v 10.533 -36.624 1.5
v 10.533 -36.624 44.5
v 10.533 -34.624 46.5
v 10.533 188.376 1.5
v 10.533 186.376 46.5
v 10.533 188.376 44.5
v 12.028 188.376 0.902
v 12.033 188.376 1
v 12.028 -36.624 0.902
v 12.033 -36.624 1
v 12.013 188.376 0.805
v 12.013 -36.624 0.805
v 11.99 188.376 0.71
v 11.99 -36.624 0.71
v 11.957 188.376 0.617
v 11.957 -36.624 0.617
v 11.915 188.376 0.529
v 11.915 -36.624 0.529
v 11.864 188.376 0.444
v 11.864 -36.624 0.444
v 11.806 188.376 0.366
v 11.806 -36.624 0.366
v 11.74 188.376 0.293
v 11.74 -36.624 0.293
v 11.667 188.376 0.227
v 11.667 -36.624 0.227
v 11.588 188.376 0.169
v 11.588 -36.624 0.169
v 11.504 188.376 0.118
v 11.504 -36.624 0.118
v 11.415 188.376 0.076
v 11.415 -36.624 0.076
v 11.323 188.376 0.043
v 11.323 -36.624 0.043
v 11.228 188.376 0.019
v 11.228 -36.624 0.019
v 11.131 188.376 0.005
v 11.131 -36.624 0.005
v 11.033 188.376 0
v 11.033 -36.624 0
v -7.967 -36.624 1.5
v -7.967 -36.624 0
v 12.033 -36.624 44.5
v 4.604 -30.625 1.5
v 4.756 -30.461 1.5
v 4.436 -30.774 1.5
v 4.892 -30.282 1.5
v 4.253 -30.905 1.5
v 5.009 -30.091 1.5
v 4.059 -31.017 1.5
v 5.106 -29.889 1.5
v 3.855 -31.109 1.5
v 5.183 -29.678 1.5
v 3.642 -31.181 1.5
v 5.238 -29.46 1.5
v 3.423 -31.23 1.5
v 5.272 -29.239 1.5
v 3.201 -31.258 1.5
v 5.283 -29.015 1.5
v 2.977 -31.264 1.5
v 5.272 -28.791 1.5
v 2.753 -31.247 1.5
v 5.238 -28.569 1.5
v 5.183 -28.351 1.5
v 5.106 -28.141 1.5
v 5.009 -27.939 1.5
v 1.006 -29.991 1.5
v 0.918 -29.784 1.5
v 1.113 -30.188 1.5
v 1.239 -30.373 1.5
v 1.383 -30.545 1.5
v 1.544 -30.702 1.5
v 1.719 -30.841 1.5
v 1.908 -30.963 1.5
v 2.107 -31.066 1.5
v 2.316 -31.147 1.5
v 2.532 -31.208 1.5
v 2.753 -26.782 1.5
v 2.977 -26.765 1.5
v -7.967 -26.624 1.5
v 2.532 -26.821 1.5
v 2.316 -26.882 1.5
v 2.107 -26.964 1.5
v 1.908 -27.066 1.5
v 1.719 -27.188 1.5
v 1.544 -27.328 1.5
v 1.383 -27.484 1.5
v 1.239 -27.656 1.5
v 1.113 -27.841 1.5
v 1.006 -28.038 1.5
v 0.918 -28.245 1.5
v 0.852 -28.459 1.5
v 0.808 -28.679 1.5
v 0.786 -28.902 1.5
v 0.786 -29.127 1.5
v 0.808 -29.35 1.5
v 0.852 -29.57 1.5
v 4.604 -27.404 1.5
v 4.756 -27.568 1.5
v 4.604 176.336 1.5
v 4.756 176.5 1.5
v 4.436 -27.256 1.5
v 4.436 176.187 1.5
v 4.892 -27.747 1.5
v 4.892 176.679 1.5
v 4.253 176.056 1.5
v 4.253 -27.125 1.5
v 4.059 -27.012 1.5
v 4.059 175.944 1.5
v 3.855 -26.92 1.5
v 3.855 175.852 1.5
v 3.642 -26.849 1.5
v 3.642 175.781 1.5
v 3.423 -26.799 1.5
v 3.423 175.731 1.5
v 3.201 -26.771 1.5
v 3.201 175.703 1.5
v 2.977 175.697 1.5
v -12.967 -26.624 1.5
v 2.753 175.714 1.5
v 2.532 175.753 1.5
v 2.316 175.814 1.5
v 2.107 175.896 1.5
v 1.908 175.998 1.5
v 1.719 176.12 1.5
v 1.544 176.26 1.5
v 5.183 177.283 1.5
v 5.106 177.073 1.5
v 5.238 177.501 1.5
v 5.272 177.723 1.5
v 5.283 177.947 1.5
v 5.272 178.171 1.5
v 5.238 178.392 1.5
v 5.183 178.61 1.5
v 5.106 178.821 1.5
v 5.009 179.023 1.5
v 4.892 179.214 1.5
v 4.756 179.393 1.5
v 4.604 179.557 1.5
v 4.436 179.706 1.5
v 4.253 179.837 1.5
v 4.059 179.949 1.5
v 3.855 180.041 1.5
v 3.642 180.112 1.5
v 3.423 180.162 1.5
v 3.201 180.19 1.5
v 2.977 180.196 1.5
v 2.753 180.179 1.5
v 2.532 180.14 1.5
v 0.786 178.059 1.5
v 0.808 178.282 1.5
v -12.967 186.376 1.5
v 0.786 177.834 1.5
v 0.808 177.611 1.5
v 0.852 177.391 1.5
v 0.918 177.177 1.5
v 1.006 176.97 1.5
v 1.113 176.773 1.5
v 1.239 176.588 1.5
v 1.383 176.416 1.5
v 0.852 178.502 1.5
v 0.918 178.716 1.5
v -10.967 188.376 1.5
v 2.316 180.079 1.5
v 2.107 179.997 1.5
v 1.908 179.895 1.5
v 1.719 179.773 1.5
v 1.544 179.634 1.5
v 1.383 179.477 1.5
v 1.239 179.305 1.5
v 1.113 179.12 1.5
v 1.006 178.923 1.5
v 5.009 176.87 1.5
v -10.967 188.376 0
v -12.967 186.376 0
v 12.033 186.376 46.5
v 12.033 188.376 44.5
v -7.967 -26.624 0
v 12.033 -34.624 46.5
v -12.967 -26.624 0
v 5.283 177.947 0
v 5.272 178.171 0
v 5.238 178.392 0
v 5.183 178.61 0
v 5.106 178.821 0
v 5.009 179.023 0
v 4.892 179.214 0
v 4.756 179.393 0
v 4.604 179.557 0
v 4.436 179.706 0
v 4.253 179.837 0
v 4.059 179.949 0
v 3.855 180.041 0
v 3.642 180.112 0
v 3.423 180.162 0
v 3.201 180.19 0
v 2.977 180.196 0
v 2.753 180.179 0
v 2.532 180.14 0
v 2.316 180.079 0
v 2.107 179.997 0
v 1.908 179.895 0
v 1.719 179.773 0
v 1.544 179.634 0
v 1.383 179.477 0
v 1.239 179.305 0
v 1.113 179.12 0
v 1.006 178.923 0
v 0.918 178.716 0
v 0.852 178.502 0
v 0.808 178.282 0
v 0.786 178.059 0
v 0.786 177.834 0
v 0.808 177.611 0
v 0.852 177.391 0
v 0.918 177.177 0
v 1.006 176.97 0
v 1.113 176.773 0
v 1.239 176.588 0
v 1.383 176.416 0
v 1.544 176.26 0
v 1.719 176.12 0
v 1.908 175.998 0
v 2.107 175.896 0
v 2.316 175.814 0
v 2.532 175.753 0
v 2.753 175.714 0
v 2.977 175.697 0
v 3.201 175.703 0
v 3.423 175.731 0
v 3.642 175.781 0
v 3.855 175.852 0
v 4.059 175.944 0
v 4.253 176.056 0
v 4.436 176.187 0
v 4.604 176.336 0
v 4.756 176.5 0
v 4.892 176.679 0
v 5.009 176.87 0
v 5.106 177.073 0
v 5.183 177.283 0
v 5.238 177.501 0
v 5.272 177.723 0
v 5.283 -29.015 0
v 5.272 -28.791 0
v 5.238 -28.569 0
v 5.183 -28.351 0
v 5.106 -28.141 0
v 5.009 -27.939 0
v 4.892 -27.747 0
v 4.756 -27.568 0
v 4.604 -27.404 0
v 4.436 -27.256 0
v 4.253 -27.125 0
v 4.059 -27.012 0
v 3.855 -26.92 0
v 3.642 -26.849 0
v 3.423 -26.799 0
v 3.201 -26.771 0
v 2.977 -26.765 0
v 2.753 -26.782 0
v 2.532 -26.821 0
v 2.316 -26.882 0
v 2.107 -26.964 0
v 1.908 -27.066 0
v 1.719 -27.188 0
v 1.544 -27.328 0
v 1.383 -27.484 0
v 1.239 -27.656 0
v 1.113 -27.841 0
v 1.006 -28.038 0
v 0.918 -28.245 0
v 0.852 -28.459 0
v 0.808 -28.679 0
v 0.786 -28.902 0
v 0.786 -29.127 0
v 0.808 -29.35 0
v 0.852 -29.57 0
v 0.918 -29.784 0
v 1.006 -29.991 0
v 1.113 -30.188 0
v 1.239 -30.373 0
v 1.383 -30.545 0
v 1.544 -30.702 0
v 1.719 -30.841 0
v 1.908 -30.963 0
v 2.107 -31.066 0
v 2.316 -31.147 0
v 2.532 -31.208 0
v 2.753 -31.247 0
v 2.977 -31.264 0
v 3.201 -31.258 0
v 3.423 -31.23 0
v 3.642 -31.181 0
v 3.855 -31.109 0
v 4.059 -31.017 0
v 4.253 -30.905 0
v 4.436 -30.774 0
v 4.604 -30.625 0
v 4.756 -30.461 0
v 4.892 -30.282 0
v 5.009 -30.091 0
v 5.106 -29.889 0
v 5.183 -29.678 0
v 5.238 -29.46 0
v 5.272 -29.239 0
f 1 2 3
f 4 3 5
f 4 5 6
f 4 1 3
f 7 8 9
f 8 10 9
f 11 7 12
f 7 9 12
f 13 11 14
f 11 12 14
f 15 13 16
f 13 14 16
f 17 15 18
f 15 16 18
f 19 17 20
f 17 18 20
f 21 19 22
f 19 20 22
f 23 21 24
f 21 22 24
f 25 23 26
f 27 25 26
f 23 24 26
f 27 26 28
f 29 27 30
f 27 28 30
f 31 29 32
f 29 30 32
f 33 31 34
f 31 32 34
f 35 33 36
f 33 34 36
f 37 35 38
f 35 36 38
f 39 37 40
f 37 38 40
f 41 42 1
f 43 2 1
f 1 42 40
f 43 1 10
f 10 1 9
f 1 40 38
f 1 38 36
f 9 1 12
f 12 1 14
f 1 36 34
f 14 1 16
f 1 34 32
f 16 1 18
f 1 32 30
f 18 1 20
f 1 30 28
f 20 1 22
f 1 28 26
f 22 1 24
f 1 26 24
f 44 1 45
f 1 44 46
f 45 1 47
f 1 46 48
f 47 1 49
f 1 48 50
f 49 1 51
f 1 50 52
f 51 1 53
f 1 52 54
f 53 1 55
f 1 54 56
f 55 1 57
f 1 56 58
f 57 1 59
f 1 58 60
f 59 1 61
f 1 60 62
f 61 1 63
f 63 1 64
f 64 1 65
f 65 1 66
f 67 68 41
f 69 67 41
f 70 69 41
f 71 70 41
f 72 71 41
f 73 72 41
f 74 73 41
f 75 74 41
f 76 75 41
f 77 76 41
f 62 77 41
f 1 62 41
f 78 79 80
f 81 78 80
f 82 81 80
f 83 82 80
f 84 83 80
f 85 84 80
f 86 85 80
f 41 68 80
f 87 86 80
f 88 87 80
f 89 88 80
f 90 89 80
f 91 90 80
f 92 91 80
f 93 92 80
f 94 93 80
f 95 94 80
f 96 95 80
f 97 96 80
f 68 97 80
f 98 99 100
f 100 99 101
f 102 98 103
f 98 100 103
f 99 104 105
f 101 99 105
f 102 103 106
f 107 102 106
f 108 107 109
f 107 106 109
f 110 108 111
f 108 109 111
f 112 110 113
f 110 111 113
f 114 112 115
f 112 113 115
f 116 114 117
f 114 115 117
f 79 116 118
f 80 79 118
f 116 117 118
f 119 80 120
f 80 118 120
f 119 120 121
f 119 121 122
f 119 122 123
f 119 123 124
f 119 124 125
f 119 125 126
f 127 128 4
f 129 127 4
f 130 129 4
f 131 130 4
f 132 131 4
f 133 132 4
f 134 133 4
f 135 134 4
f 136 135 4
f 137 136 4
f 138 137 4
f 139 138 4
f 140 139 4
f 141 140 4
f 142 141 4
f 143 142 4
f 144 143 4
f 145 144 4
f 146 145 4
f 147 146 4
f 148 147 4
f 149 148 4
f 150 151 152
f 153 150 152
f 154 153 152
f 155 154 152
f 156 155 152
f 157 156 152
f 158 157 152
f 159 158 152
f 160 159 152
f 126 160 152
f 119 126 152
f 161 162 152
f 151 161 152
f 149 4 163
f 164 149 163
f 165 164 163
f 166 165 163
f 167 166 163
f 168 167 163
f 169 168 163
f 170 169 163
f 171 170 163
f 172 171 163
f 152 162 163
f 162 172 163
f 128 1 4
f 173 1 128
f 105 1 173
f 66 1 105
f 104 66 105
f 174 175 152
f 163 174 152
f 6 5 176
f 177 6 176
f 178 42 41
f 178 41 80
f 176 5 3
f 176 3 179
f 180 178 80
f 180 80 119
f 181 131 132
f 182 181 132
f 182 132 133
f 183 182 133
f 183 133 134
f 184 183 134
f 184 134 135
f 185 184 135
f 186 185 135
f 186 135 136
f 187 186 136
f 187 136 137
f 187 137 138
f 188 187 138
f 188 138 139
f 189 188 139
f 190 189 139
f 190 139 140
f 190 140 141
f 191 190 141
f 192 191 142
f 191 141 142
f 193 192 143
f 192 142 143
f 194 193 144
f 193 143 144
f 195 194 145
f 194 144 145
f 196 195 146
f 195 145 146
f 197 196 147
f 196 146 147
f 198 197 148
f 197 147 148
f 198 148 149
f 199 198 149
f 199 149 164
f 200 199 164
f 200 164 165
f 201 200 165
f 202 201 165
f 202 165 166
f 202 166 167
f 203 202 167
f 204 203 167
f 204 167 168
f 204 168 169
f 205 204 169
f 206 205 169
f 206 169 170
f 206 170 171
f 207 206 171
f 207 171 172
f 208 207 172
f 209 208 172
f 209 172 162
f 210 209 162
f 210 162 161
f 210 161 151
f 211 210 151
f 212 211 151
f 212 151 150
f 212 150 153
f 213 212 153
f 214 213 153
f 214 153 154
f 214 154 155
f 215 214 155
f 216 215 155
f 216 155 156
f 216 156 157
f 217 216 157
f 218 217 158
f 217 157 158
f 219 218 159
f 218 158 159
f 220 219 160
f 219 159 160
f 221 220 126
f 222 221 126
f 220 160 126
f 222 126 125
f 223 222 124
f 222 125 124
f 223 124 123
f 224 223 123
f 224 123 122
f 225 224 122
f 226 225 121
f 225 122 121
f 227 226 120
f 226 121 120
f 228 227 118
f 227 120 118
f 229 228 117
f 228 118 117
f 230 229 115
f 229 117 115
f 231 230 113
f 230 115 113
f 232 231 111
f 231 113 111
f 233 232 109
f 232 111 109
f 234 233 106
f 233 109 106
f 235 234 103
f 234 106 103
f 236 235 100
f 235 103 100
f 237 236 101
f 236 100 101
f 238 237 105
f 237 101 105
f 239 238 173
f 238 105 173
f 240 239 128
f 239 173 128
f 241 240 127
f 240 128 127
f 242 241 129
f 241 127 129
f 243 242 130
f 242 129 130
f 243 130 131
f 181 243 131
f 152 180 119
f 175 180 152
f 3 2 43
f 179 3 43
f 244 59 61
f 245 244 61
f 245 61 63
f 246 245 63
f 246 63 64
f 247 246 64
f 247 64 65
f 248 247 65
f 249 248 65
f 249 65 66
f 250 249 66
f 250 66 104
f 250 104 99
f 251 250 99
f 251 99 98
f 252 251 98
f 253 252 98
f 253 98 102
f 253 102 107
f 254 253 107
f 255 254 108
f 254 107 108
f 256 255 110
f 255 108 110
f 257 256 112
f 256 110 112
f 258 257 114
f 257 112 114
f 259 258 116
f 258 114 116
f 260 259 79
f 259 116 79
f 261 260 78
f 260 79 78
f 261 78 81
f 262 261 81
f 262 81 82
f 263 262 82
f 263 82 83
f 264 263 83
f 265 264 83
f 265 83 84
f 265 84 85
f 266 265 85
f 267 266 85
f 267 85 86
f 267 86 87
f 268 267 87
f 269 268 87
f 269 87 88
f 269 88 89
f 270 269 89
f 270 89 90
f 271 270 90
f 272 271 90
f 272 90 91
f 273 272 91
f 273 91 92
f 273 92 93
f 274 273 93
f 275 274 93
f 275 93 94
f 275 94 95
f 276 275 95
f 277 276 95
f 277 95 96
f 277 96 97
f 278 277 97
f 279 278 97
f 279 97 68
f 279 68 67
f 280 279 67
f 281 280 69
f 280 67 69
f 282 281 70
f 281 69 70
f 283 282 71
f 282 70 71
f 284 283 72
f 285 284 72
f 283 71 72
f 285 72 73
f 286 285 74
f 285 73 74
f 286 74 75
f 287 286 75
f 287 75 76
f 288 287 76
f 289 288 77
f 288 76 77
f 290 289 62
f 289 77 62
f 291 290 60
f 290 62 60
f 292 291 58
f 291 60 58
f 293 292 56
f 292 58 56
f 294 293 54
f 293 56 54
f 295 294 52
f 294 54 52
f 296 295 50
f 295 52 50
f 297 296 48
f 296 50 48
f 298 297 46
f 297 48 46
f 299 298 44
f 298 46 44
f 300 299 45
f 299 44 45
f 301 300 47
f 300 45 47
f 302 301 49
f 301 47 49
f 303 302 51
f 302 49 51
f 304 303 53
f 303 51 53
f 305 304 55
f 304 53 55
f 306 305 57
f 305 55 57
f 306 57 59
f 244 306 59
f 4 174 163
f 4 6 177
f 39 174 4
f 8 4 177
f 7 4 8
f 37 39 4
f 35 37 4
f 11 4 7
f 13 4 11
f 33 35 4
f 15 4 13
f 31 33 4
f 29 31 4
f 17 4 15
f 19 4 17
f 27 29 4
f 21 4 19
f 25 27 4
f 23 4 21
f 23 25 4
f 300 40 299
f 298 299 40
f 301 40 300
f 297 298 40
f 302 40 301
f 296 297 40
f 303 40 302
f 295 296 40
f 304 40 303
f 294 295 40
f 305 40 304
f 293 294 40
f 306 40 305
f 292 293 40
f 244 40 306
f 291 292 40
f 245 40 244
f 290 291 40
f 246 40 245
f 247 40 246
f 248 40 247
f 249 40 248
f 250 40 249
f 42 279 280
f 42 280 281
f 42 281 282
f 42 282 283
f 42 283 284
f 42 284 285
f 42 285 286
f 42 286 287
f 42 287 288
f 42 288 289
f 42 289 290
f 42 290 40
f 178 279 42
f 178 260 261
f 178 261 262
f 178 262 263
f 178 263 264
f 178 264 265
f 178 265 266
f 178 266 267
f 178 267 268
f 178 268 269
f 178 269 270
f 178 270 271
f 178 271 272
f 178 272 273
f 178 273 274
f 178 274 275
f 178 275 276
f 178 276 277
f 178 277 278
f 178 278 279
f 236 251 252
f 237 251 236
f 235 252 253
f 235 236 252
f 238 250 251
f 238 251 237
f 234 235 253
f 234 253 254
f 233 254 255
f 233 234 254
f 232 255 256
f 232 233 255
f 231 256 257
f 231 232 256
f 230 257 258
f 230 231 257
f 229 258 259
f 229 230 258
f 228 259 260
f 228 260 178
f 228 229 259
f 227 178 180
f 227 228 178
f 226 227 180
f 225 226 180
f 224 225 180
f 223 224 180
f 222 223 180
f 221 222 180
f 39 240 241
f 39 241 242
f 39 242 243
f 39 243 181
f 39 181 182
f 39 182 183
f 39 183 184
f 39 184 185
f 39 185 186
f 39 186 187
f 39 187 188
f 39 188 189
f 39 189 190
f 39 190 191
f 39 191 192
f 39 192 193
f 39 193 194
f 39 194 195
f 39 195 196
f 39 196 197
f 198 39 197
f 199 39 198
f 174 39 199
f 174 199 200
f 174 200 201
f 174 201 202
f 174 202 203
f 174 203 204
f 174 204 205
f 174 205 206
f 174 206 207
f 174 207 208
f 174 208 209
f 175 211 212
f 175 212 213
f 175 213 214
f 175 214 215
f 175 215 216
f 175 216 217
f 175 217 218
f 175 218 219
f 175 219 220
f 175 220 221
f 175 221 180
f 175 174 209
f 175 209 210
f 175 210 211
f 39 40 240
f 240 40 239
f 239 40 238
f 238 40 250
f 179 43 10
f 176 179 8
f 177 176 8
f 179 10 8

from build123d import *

# Parameters (mm, degrees)
BOSS_EXTRUDE1_DEPTH = 1.5
SKETCH2_W           = 1.5
SKETCH2_H           = 225
BOSS_EXTRUDE2_DEPTH = 45
CHAMFER1_SIZE       = 2
FILLET1_R           = 1
SKETCH3_R           = 2.25
CUT_EXTRUDE1_DEPTH  = 2.5


with BuildPart() as part:
    # Sketch1 → Boss-Extrude1 (new body)
    with BuildSketch(Plane.XY):
        Polygon((-12.96728972, 188.376168224), (12.03271028, 188.376168224), (12.03271028, -36.623831776), (-7.96728972, -36.623831776), (-7.96728972, -26.623831776), (-12.96728972, -26.623831776), align=None)
    extrude(amount=BOSS_EXTRUDE1_DEPTH)

    # Sketch2 → Boss-Extrude2 (add)
    with BuildSketch(Plane.XY.offset(1.5)):
        with Locations((11.28271028, 75.876168224)):
            Rectangle(SKETCH2_W, SKETCH2_H)
    extrude(amount=BOSS_EXTRUDE2_DEPTH)

    # Chamfer1
    chamfer1_edges = [part.edges().sort_by_distance(p)[0] for p in [
        (-12.96728972, 188.376168224, 0.75),
        (11.28271028, 188.376168224, 46.5),
        (11.28271028, -36.623831776, 46.5),
    ]]
    chamfer(chamfer1_edges, length=CHAMFER1_SIZE)

    # Fillet1
    fillet1_edges = [part.edges().sort_by_distance(p)[0] for p in [
        (12.03271028, 75.876168224, 0),
    ]]
    fillet(fillet1_edges, radius=FILLET1_R)

    # Sketch3 → Cut-Extrude1 (cut, through all)
    with BuildSketch(Plane.XY.offset(1.5)):
        with Locations((3.03271028, 177.946548893)):
            Circle(SKETCH3_R)
        with Locations((3.03271028, -29.014631464)):
            Circle(SKETCH3_R)
    extrude(amount=-CUT_EXTRUDE1_DEPTH, mode=Mode.SUBTRACT)


solid = part.part
